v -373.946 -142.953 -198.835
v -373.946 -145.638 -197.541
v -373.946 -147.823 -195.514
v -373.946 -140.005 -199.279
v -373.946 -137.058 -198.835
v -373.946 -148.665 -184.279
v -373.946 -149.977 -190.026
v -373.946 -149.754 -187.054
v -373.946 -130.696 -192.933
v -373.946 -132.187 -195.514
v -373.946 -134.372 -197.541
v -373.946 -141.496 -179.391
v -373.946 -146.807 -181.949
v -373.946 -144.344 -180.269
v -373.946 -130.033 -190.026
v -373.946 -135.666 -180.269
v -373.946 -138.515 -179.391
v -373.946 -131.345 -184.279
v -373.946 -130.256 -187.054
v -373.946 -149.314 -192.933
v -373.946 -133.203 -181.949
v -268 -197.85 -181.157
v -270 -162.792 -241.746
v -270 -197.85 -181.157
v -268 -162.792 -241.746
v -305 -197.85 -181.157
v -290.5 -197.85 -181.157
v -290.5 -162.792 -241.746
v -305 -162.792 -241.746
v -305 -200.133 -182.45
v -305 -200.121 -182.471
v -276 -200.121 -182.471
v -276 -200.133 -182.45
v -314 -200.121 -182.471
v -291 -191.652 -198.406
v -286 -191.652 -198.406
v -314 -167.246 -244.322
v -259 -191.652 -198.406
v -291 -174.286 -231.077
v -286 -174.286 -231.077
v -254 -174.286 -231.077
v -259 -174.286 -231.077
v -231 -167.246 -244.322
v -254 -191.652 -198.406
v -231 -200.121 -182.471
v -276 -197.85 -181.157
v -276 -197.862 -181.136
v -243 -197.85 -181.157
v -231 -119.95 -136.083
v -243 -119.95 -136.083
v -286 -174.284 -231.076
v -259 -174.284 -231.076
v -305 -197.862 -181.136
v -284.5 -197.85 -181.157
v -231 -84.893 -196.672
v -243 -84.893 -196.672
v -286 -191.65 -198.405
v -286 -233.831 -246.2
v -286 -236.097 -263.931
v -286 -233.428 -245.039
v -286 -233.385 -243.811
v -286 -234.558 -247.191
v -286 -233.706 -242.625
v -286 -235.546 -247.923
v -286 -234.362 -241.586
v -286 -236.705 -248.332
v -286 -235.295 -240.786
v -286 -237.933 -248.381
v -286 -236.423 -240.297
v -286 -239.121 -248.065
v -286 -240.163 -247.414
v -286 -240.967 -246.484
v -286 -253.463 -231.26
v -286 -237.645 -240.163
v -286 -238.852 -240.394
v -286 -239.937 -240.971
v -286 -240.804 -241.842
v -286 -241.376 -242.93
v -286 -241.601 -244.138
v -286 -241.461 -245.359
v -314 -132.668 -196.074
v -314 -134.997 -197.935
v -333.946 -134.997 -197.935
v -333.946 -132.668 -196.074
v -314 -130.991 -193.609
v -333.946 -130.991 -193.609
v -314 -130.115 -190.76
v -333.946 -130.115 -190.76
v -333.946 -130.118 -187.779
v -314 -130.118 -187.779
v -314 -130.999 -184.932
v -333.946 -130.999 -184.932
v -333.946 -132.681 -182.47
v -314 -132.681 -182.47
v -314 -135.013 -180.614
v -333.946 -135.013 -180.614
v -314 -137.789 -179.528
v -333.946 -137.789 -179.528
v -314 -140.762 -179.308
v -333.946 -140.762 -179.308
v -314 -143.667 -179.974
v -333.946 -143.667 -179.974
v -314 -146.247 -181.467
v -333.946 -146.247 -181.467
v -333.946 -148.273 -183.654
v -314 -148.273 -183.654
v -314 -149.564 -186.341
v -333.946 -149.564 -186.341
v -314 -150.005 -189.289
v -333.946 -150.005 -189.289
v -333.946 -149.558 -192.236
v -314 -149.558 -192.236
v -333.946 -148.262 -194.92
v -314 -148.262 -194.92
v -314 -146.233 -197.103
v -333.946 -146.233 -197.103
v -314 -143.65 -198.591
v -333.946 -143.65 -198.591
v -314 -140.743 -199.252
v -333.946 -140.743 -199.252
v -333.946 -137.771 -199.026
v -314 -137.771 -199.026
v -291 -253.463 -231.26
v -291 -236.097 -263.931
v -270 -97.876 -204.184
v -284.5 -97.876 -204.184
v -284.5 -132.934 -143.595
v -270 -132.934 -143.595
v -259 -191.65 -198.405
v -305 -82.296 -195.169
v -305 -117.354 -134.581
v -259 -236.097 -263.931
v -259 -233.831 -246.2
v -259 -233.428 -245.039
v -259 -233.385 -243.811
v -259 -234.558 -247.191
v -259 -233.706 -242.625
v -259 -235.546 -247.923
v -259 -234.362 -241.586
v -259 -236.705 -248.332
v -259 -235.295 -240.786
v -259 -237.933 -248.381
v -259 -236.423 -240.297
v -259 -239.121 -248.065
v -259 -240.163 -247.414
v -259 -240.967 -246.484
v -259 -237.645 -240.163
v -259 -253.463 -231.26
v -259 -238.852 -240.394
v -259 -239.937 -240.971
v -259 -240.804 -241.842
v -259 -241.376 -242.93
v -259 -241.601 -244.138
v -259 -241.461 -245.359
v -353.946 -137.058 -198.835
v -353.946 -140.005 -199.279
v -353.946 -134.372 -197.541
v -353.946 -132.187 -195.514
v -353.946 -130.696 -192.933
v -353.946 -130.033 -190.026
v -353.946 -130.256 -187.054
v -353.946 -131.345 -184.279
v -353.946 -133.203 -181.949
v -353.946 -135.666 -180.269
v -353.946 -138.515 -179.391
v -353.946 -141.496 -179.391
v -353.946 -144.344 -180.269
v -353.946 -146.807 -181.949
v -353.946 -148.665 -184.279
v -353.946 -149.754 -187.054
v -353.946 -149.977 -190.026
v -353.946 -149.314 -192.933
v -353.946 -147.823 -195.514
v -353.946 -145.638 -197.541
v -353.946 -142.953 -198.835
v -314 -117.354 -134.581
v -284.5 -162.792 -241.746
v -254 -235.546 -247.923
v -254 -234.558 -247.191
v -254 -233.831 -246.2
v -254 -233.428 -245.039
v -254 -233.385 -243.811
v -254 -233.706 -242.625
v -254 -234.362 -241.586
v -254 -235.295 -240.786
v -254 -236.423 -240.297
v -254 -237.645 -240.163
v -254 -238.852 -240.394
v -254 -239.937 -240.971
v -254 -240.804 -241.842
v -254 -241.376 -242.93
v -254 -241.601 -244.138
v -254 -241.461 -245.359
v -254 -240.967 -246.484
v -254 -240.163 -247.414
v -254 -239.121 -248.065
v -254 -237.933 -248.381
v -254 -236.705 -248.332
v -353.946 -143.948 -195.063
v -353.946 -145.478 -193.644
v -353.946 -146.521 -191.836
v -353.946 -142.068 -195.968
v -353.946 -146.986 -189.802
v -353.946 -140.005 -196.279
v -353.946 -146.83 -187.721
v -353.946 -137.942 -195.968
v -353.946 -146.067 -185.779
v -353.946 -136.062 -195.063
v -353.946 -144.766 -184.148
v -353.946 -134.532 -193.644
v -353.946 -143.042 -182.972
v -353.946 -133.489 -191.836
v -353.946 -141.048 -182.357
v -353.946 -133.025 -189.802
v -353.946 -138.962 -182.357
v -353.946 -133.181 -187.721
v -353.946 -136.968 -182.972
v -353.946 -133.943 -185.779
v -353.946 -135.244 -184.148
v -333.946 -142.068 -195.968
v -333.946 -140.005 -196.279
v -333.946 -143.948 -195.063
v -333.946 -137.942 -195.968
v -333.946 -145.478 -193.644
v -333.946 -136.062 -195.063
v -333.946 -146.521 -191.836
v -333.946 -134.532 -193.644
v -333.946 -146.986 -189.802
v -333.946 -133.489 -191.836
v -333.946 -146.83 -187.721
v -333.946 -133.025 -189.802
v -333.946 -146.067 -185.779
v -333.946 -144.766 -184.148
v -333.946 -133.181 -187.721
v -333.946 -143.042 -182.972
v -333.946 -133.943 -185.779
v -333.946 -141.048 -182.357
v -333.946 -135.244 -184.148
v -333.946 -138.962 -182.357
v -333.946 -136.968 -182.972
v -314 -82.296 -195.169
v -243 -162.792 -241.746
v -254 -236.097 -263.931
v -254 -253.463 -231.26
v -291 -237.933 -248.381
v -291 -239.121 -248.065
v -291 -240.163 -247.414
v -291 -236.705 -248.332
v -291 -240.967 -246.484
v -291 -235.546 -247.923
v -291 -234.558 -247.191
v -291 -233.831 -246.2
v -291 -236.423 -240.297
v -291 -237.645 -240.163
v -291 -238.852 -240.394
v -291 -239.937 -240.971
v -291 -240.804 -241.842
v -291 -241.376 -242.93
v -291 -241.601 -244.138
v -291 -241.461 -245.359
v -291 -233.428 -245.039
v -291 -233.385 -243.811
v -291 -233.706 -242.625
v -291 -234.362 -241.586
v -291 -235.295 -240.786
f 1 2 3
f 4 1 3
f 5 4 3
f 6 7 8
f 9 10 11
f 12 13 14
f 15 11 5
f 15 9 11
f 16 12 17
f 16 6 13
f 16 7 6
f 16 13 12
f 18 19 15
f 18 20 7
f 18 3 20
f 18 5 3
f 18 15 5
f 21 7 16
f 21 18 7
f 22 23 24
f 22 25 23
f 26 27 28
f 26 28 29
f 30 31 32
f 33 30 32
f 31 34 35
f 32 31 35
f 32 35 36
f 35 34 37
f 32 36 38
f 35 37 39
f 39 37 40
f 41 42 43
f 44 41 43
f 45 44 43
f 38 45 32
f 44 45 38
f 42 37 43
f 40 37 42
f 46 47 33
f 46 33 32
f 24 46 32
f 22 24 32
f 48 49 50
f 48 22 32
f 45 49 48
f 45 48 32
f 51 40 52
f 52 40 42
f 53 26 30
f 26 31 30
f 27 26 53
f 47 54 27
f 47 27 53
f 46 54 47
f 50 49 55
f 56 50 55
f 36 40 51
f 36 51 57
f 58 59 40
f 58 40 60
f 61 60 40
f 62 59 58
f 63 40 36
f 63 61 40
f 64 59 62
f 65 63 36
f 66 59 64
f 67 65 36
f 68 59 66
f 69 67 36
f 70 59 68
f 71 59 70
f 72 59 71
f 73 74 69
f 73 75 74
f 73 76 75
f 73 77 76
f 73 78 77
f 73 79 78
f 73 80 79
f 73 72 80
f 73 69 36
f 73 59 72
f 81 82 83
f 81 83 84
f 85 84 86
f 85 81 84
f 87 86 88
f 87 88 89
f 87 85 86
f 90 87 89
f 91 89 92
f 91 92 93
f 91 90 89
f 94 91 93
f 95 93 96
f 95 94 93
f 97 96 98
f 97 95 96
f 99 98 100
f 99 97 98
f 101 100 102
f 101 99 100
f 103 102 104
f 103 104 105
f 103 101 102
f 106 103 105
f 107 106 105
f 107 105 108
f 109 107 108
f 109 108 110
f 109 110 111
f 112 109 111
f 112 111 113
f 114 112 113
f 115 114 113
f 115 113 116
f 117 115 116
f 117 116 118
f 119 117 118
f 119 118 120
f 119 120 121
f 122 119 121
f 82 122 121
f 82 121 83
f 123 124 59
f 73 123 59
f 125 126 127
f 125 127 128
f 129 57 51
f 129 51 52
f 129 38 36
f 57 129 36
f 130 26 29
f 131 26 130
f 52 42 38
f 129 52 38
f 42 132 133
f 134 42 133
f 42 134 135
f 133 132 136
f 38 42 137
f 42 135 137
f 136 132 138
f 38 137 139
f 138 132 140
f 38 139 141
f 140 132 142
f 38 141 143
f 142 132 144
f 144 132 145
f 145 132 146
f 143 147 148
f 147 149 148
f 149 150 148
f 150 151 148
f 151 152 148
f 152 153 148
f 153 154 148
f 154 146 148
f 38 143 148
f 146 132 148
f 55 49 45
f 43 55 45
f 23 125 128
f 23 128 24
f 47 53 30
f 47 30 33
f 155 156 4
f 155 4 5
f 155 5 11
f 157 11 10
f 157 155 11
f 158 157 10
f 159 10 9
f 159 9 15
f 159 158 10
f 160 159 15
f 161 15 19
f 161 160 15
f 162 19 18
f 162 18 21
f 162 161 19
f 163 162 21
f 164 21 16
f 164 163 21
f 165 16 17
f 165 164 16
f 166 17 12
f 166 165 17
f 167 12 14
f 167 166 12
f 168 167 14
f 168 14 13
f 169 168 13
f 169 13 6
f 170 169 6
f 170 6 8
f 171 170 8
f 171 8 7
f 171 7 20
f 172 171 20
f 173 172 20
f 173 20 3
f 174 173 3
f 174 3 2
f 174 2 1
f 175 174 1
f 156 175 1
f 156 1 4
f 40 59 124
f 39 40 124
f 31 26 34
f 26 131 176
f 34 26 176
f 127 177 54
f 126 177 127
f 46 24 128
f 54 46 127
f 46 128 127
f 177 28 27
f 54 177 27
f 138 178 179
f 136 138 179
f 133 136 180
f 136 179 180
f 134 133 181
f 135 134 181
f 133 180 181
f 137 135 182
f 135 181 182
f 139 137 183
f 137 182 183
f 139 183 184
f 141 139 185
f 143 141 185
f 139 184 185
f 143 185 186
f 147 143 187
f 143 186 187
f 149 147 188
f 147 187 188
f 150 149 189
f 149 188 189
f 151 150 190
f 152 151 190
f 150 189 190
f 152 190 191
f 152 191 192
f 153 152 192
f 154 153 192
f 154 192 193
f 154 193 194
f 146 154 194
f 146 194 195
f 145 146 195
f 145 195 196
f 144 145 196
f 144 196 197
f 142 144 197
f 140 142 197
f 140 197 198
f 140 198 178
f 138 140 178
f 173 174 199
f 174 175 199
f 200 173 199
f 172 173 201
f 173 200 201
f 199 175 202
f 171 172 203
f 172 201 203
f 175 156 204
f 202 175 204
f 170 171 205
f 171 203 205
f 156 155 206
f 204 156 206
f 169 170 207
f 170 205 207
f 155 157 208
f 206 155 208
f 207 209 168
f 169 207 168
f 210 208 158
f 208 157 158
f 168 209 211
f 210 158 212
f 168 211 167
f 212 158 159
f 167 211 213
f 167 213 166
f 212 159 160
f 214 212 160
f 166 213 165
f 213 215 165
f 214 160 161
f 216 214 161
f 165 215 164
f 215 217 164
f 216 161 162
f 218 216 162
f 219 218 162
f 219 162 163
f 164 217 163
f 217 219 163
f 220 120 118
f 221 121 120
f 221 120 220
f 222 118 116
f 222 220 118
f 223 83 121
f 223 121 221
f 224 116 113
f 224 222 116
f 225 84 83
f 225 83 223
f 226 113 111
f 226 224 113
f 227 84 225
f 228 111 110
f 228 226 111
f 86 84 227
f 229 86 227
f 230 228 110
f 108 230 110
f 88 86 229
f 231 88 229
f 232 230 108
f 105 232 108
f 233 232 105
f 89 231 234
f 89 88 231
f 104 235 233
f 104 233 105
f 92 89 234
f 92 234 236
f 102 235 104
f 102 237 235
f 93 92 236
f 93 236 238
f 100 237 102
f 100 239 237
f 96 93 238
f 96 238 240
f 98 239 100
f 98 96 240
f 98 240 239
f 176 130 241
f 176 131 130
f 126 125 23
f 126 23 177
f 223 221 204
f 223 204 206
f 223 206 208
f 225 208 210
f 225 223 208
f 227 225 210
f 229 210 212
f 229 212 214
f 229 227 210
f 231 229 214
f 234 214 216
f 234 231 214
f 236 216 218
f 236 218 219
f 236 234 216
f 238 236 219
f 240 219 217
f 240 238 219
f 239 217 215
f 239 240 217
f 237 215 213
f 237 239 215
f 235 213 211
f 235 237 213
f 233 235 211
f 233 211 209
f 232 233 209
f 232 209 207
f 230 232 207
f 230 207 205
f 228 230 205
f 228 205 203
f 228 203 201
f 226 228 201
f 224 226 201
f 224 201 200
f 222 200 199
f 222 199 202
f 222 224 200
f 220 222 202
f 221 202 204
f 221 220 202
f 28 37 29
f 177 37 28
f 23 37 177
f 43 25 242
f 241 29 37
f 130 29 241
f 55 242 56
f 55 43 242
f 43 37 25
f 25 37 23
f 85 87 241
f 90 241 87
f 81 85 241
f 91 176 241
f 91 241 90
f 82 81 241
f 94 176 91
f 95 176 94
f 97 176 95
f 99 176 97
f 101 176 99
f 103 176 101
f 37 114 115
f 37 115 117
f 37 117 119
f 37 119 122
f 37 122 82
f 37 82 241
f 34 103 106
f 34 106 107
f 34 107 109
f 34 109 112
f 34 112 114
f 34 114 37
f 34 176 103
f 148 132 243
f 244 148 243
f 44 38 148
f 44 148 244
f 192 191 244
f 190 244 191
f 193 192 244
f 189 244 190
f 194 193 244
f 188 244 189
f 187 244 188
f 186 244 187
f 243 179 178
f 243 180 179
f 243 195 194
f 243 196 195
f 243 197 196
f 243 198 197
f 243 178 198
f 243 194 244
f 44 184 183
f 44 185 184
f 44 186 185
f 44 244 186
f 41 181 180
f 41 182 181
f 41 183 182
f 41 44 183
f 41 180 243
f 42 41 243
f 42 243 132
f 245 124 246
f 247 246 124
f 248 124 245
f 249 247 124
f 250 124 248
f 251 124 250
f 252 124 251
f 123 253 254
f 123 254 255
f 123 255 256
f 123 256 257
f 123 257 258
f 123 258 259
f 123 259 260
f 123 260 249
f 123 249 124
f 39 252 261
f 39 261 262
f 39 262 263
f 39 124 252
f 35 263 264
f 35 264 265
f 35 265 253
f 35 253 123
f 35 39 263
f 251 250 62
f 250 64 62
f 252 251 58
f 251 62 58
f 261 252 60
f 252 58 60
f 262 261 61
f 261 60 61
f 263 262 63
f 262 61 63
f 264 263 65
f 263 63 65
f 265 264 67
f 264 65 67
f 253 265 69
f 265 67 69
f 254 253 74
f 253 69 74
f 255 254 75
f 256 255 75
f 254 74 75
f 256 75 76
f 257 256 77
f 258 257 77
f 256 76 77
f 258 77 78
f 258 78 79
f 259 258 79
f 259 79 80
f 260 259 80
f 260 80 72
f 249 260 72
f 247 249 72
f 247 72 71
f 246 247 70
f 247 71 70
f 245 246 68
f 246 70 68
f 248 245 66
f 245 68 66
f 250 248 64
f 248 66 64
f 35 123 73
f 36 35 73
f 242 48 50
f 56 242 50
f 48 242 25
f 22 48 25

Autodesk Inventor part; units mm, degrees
sketch "Sketch1" plane through (0, 0, 0) normal (1, 0, 0) x (0, 1, 0)
  line L0 (15, -38) -> (-51, -38)
  line L1 (-51, -38) -> (-51, -56)
  line L2 (-51, -56) -> (15, -56)
  line L3 (15, -38) -> (15, -56)
  arc A0 (29.5, -43.2058) -> (20.5, -58.7942) centre (25, -51) ccw
  arc A1 (33.0623, -37.0358) -> (16.9377, -64.9642) centre (25, -51) ccw
  line L4 (29.5, -43.2058) -> (39.0263, -48.7058)
  line L5 (20.5, -58.7942) -> (30.0263, -64.2942)
  line L6 (16.9377, -64.9642) -> (26.464, -70.4642)
  line L7 (33.0623, -37.0358) -> (42.5885, -42.5358)
  line L8 (42.5885, -42.5358) -> (39.0263, -48.7058)
  line L9 (30.0263, -64.2942) -> (26.464, -70.4642)
  line L10 (-51, -38) -> (-79, -38)
  line L11 (-79, -38) -> (-79, -56)
  line L12 (-51, -56) -> (-79, -56)
  dimension "d1" = 18
extrude "Extrusion1" add sketch "Sketch1" along normal blind 10 contours L3 A1 L2 L1 L0 | A1 L7 L8 L4 A0 L5 L9 L6 L2 L3 | L3 L2 A1
thicken "Thicken1" operation add thickness 5 both sides no extend neighbours yes toward (0, 0.8660254, -0.5) faces at (3.3333, 28.8389, -66.3509)
thicken "Thicken2" operation add thickness 5 both sides no extend neighbours yes toward (0, 0.8660254, -0.5) faces at (3.3333, 41.4011, -44.5924)
thicken "Thicken3" operation add thickness 200 both sides no extend neighbours yes toward (0, -1, 0) faces at (3.3333, -51, -44)
thicken "Thicken4" operation add thickness 30 both sides no extend neighbours yes toward (-1, 0, 0) faces at (0, -75.4432, -44)
sketch "Sketch2" plane through (10, 0, 0) normal (1, 0, 0) x (0, 0, -1)
  arc A0 (37.0358, 33.0623) -> (38.3509, 15) centre (51, 25) ccw projected
  line L0 (56, 10) -> (38.3509, 15)
  line L1 (38.3509, 15) -> (23, -17)
  line L2 (23, -17) -> (9, -332)
  line L3 (9, -332) -> (100, -328)
  line L4 (100, -328) -> (71, -47)
  line L5 (71, -47) -> (56, 10)
  point P0 (0, 0)
extrude "Extrusion2" cut sketch "Sketch2" against normal blind 100
sketch "Sketch3" plane through (10, 0, 0) normal (1, 0, 0) x (0, 0, -1)
  line L0 (56, 10) -> (152, -151)
  line L1 (152, -151) -> (131, -151)
  line L2 (38.3509, 15) -> (56, 10) projected
  line L3 (131, -151) -> (38.3509, 15)
  point P0 (0, 0)
extrude "Extrusion3" add sketch "Sketch3" against normal blind 40
thicken "Thicken5" operation add thickness 100 both sides no extend neighbours yes toward (0, -1, 0) faces at (-3.3333, -151, -145)
sketch "Sketch4" plane through (10, 0, 0) normal (1, 0, 0) x (0, 0, -1)
  line L0 (29, -65) -> (197, -65)
  line L1 (197, -65) -> (243, -262)
  line L2 (243, -262) -> (173, -278.3452)
  line L3 (173, -278.3452) -> (29, -65)
  point P0 (0, 0)
extrude "Extrusion4" cut sketch "Sketch4" against normal blind 40
thicken "Thicken6" operation add thickness 40 both sides no extend neighbours yes toward (1, 0, 0) faces at (10, 14.7562, -38.117)
thicken "Thicken7" operation add thickness 5 both sides no extend neighbours yes toward (0, -0.5, -0.8660254) faces at (-16.6667, 26.1753, -70.2976) (-3.3333, 10.1872, -57.3703) (-3.3333, -15.1835, -71.0162)
ref_plane "Work Plane1" through (10, -65, -83.0011) normal (1, 0, 0) x (0, 0, -1)
sketch "Sketch6" plane through (10, -65, -83.0011) normal (1, 0, 0) x (0, 0, -1)
  line L0 (23.5408, 0) -> (0, 0) projected
  line L1 (23.5408, 0) -> (65, -73)
  line L2 (65, -73) -> (86.5815, -111)
  line L3 (0, 0) -> (-44.6502, 80) projected
  line L4 (0, 0) -> (59, -111)
  line L5 (59, -111) -> (86.5815, -111)
  point P0 (-83.0011, 65)
extrude "Extrusion6" add sketch "Sketch6" along normal mid plane 40
thicken "Thicken8" operation add thickness 100 both sides no extend neighbours yes toward (0, -1, 0) faces at (3.3333, -176, -151.1949)
thicken "Thicken9" operation add thickness 20 both sides no extend neighbours yes toward (0, 0.8660254, -0.5) faces at (-16.6667, 45.7312, -47.0924)
thicken "Thicken10" operation add thickness 20 both sides no extend neighbours yes toward (0, 0.8660254, -0.5) faces at (-3.3333, 32.3357, -70.2943)
sketch "Sketch7" plane through (30, -65, -83.0011) normal (1, 0, 0) x (0, 0, -1)
  line L0 (112.1532, -211) -> (143.3749, -211) projected
  line L1 (23.5408, 0) -> (143.3749, -211) projected
  line L2 (143.3749, -211) -> (130, -187.4499)
  line L3 (130, -187.4499) -> (99.6355, -187.4499)
  line L4 (0, 0) -> (112.1532, -211) projected
  line L5 (112.1532, -211) -> (99.6355, -187.4499)
  point P0 (-83.0011, 65)
extrude "Extrusion7" add sketch "Sketch7" against normal blind 400
thicken "Thicken12" operation add thickness 65 both sides no extend neighbours yes toward (1, 0, 0) faces at (-370, -268.15, -211.5104)
sketch "Sketch8" plane through (-305, -276, -226.376) normal (-1, 0, 0) x (0, 0, 1)
  line L0 (43.7393, 23.5501) -> (13.3749, 23.5501) projected
  line L1 (43.7393, 23.5501) -> (20.991, 36.7127)
  line L2 (13.3749, 23.5501) -> (43.7393, 23.5501) projected
  line L3 (20.991, 36.7127) -> (13.3749, 23.5501)
  point P0 (226.376, 276)
extrude "Extrusion8" add sketch "Sketch8" against normal blind 300
sketch "Sketch9" plane through (-305, -239.2873, -205.385) normal (0, 0.8655505, 0.5008216) x (1, 0, 0)
  line L0 (0, -0.2177) -> (0, -27.2417) projected
  line L1 (0, -0.2177) -> (0, -27.2417)
  line L2 (0, -27.2417) -> (29, -27.2417)
  line L3 (0, -27.2417) -> (335, -27.2417) projected
  line L4 (0, -0.2177) -> (29, -0.2177)
  line L5 (0, -0.2177) -> (335, -0.2177) projected
  line L6 (29, -27.2417) -> (29, -0.2177)
  point P0 (305, -57.9308)
extrude "Extrusion9" add sketch "Sketch9" along normal blind 70
thicken "Thicken13" operation add thickness 15 both sides no extend neighbours yes toward (0, -0.8655505, -0.5008216) faces at (-295.3333, -187.8307, -154.5452)
thicken "Thicken14" operation add thickness 7 both sides no extend neighbours yes toward (0, -0.8655505, -0.5008216) faces at (-295.3333, -200.8139, -162.0576)
sketch "Sketch10" plane through (-276, -239.3964, -205.1965) normal (0, 0.5008216, -0.8655505) x (-1, 0, 0)
  line L0 (0, 48) -> (29, 48) projected
  line L1 (0, 48) -> (-35, 48)
  line L2 (-35, 48) -> (-35, 81)
  line L3 (-35, 81) -> (-35, 106)
  line L4 (29, 48) -> (29, 121)
  line L5 (-35, 106) -> (-35, 138)
  line L6 (-35, 138) -> (-45, 138)
  line L7 (-45, 138) -> (-45, 41)
  line L8 (-45, 41) -> (29, 41)
  line L9 (29, 0) -> (29, 48) projected
  line L10 (29, 41) -> (29, 48)
  line L11 (29, 48) -> (29, 41)
  line L12 (29, 121) -> (29, 141)
  line L13 (29, 141) -> (38, 141)
  line L14 (38, 141) -> (38, 41)
  line L15 (38, 41) -> (29, 41)
  line L16 (29, 81) -> (0, 81)
  line L17 (0, 81) -> (0, 48)
  point P0 (-276, 309.9765)
  dimension "d49" = 35
extrude "Extrusion10" add sketch "Sketch10" along normal blind 70 contours L0 L9 L8 L7 L6 L5 L3 L2 L1 | L4 L12 L13 L14 L15 L9
sketch "Sketch12" plane through (-276, -204.3389, -265.785) normal (0, 0.5008216, -0.8655505) x (-1, 0, 0)
  line L0 (29, 48) -> (0, 48) projected
  line L1 (14.5, 48) -> (14.5, 123)
  line L2 (14.5, 123) -> (-8, 123)
  line L3 (-8, 123) -> (-8, 48)
  line L4 (-8, 48) -> (14.5, 48)
  point P0 (-276, 309.9765)
extrude "Extrusion11" add sketch "Sketch12" against normal blind 70
thicken "Thicken15" operation add thickness 2 both sides no extend neighbours yes toward (-1, 0, 0) faces at (-268, -142.8866, -176.3122)
thicken "Thicken16" operation add thickness 2 both sides no extend neighbours yes toward (1, 0, 0) faces at (-290.5, -142.8866, -176.3122)
thicken "Thicken17" operation add thickness 4 both sides no extend neighbours yes toward (1, 0, 0) faces at (-288.5, -142.8866, -176.3122)
thicken "Thicken18" operation add thickness 2 both sides no extend neighbours yes toward (-1, 0, 0) faces at (-241, -160.1976, -186.3286)
ref_plane "Work Plane2" through (-137.5, -65, -83.0011) normal (1, 0, 0) x (0, 0, -1)
sketch "Sketch13" plane through (-137.5, -65, -83.0011) normal (1, 0, 0) x (0, 0, -1)
  line L0 (143.3749, -211) -> (112.1532, -211) projected
  line L1 (130, -187.4499) -> (143.3749, -211) projected
  line L2 (143.3749, -211) -> (14, -211)
  line L3 (14, -211) -> (14, -187.4499)
  line L4 (14, -187.4499) -> (130, -187.4499)
  point P0 (-83.0011, 65)
extrude "Extrusion12" add sketch "Sketch13" along normal mid plane 30
thicken "Thicken19" operation add thickness 150 both sides no extend neighbours yes toward (0, 0, 1) faces at (-142.5, -260.3, -97.0011)
thicken "Thicken20" operation add thickness 20 both sides no extend neighbours yes toward (0, 0, -1) faces at (-142.5, -260.3, 52.9989)
sketch "Sketch14" plane through (-152.5, -276, 32.9989) normal (0, 0, 1) x (1, 0, 0)
  line L0 (30, 23.5501) -> (30, 0) projected
  line L1 (0, 23.5501) -> (30, 23.5501) projected
  line L2 (0, 0) -> (30, 0) projected
  line L3 (0, 0) -> (0, 23.5501) projected
  circle A0 centre (15, 11.775) radius 8
  point P0 (152.5, 276)
extrude "Extrusion13" add sketch "Sketch14" along normal blind 70 contours A0
thicken "Thicken21" operation add thickness 30 both sides no extend neighbours yes toward (0, 0, -1) faces at (-134.9108, -264.8631, 102.9989)
sketch "Sketch15" plane through (-122.5, -65, -83.0011) normal (1, 0, 0) x (0, 0, -1)
  arc A0 (-202, -264) -> (-180, -132) centre (-216.7127, -193.7146) ccw
  arc A1 (-204.0725, -254.0995) -> (-185.1714, -140.6932) centre (-216.7127, -193.7146) ccw
  arc A2 (-200.0254, -273.433) -> (-175.0728, -123.7173) centre (-216.7127, -193.7146) ccw
  line L0 (-175.0728, -123.7173) -> (-185.1714, -140.6932)
  line L1 (-204.0725, -254.0995) -> (-200.0254, -273.433)
  point P0 (-83.0011, 65)
extrude "Extrusion14" add sketch "Sketch15" against normal blind 30
sketch "Sketch16" plane through (-122.5, -65, -83.0011) normal (1, 0, 0) x (0, 0, -1)
  point P0 (-83.0011, 65)
ref_plane "Work Plane3" through (-137.5, -65, -83.0011) normal (1, 0, 0) x (0, 0, -1)
sketch "Sketch17" plane through (-137.5, -65, -83.0011) normal (1, 0, 0) x (0, 0, -1)
  arc A0 (-204.0725, -254.0995) -> (-185.1714, -140.6932) centre (-216.7127, -193.7146) ccw projected
  arc A1 (-200.5833, -270.7677) -> (-176.465, -126.0576) centre (-216.7127, -193.7146) ccw
  line L0 (-176.465, -126.0576) -> (-223, -140.6932)
  line L1 (-223, -140.6932) -> (-219, -249)
  line L2 (-219, -249) -> (-200.5833, -270.7677)
  point P0 (-83.0011, 65)
extrude "Extrusion15" cut sketch "Sketch17" against normal blind 14
sketch "Sketch18" plane through (-122.5, -65, -83.0011) normal (1, 0, 0) x (0, 0, -1)
  point P0 (-83.0011, 65)
ref_plane "Work Plane4" through (-124.5, -65, -83.0011) normal (1, 0, 0) x (0, 0, -1)
sketch "Sketch19" plane through (-124.5, -65, -83.0011) normal (1, 0, 0) x (0, 0, -1)
  arc A0 (-200.0254, -273.433) -> (-175.0728, -123.7173) centre (-216.7127, -193.7146) ccw projected
  arc A1 (-200.6398, -270.4982) -> (-176.6058, -126.2942) centre (-216.7127, -193.7146) ccw
  line L0 (-176.6058, -126.2942) -> (-213.3412, -154.8678)
  line L1 (-213.3412, -154.8678) -> (-216.7127, -283)
  line L2 (-216.7127, -283) -> (-200.6398, -270.4982)
  point P0 (-83.0011, 65)
extrude "Extrusion16" cut sketch "Sketch19" against normal blind 14
thicken "Thicken22" operation add thickness 150 both sides no extend neighbours yes toward (1, 0, 0) faces at (-122.5, -268.15, -114.9306)
thicken "Thicken23" operation add thickness 150 both sides no extend neighbours yes toward (1, 0, 0) faces at (-152.5, -268.15, -114.9306)
thicken "Thicken24" operation add thickness 150 both sides no extend neighbours yes toward (1, 0, 0) faces at (-122.5, -266.9722, 59.5019)
thicken "Thicken25" operation add thickness 150 both sides no extend neighbours yes toward (1, 0, 0) faces at (-152.5, -266.9722, 59.5019)
sketch "Sketch20" plane through (-137.5, -264.225, 32.9989) normal (0, 0, -1) x (-1, 0, 0)
  circle A0 centre (0, 0) radius 10.0499
  point P0 (-137.5, 264.225)
extrude "Extrusion17" cut sketch "Sketch20" against normal blind 40
sketch "Sketch21" plane through (27.5, -276, 32.9989) normal (0, 0, 1) x (1, 0, 0)
  circle A0 centre (-13, 11) radius 8.9443
  point P0 (-27.5, 276)
extrude "Extrusion18" add sketch "Sketch21" along normal blind 40
thicken "Thicken26" operation add thickness 3 both sides no extend neighbours yes toward (0, -0.5353442, -0.844634) faces at (17.5, -302.3163, 64.9194) (7.5, -200.0346, 98.8042) (7.5, -331.9885, 118.3734) (17.5, -291.7419, 81.603)
thicken "Thicken27" operation add thickness 3 both sides no extend neighbours yes toward (-1, 0, 0) faces at (-2.5, -241.3228, 60.0882)
sketch "Sketch23" plane through (30, -65, -83.0011) normal (1, 0, 0) x (0, 0, -1)
  line L0 (143.3749, -211) -> (23.5408, 0) projected
  line L1 (112.1532, -211) -> (143.3749, -211) projected
  line L2 (0, 0) -> (112.1532, -211) projected
  line L3 (112.1532, -211) -> (227, -459)
  line L4 (227, -459) -> (284.2225, -459)
  line L5 (284.2225, -459) -> (143.3749, -211)
  point P0 (-83.0011, 65)
extrude "Extrusion19" add sketch "Sketch23" against normal blind 50
sketch "Sketch24" plane through (30.5, -258.7146, 133.7116) normal (1, 0, 0) x (0, -0.164399, -0.9863939)
  point P0 (89.3599, 277.1765)
ref_plane "Work Plane5" through (28.5, -258.7146, 133.7116) normal (1, 0, 0) x (0, -0.164399, -0.9863939)
sketch "Sketch25" plane through (28.5, -258.7146, 133.7116) normal (1, 0, 0) x (0, -0.164399, -0.9863939)
  arc A0 (29.5658, -75.8904) -> (29.5658, 75.8904) centre (0, 0) ccw projected
  arc A1 (28.9727, -74.3679) -> (28.9727, 74.3679) centre (0, 0) ccw
  line L0 (28.9727, 74.3679) -> (10, 52)
  line L1 (10, 52) -> (7, -23)
  line L2 (7, -23) -> (7, -70)
  line L3 (7, -70) -> (28.9727, -74.3679)
  point P0 (89.3599, 277.1765)
extrude "Extrusion20" cut sketch "Sketch25" against normal blind 31
sketch "Sketch26" plane through (-10, -65, -83.0011) normal (0, -0.4693491, 0.8830127) x (1, 0, 0)
  line L0 (-323, -166) -> (-187, -166)
  line L1 (-221, -167.8541) -> (-304, -167.8541) projected
  line L2 (-187, -166) -> (-176, 142)
  line L3 (-176, 142) -> (163, 177)
  line L4 (163, 177) -> (104, -166)
  line L5 (104, -166) -> (180, -544)
  line L6 (180, -544) -> (-44, -703)
  line L7 (-44, -703) -> (-203.3393, -623.5)
  line L8 (-203.3393, -623.5) -> (-196.1783, -422.9935)
  line L9 (-196.1783, -422.9935) -> (-455, -378.4732)
  line L10 (-455, -378.4732) -> (-323, -166)
  point P0 (10, 96.3523)
extrude "Extrusion21" cut sketch "Sketch26" along normal mid plane 1000
sketch "Sketch27" plane through (-305, -211.3842, -157.7664) normal (0, 0.8655505, 0.5008216) x (1, 0, 0)
  line L0 (0, 27) -> (45, 27)
  line L1 (45, 27) -> (45, -17)
  line L2 (45, -17) -> (8, -14)
  line L3 (8, -14) -> (-11, 2)
  line L4 (-11, 2) -> (0, 27)
  point P0 (305, -30.6891)
extrude "Extrusion22" cut sketch "Sketch27" against normal blind 10
sketch "Sketch28" plane through (-314, -167.2455, -244.3222) normal (0, -0.8830127, -0.4693491) x (1, 0, 0)
  line L0 (83, 0) -> (0, 0) projected
  line L1 (83, 70.0454) -> (83, 0) projected
  line L2 (0, 0) -> (0, 70.0454) projected
  point P0 (314, 137.2431)
sketch "Sketch29" plane through (-314, -167.2455, -244.3222) normal (0, -0.8830127, -0.4693491) x (1, 0, 0)
  line L0 (60, 15) -> (23, 15)
  line L1 (23, 15) -> (23, 52)
  line L2 (23, 52) -> (60, 52)
  line L3 (60, 52) -> (60, 15)
  point P0 (314, 137.2431)
extrude "Extrusion23" add sketch "Sketch29" along normal blind 70
sketch "Sketch30" plane through (-314, -229.0564, -277.1766) normal (0, -0.8830127, -0.4693491) x (1, 0, 0)
  line L0 (23, 15) -> (60, 15) projected
  line L1 (23, 15) -> (60, 15) projected
  line L2 (60, 15) -> (60, 52) projected
  line L3 (60, 52) -> (23, 52) projected
  line L4 (23, 52) -> (23, 15) projected
  line L5 (55, 15) -> (55, 52)
  line L6 (28, 15) -> (28, 52)
  point P0 (314, 137.2431)
extrude "Extrusion24" cut sketch "Sketch30" against normal blind 70 contours L6 L3 L5 L0
sketch "Sketch31" plane through (-254, -191.6516, -198.4055) normal (1, 0, 0) x (0, 0.4693491, -0.8830127)
  circle A0 centre (19, -62) radius 4.1231
  point P0 (-85.2431, 262.3523)
extrude "Extrusion25" cut sketch "Sketch31" against normal blind 70
sketch "Sketch32" plane through (-231, -119.9504, -136.0831) normal (1, 0, 0) x (0, 0.5008216, -0.8655505)
  circle A0 centre (36, -44) radius 10
  point P0 (-57.7131, 171.9765)
extrude "Extrusion26" add sketch "Sketch32" along normal blind 20
sketch "Sketch33" plane through (-211, -140.0051, -189.2791) normal (1, 0, 0) x (0, 0, -1)
  circle A0 centre (0, 0) radius 10 projected
  circle A1 centre (0, 0) radius 7
  point P0 (-189.2791, 140.0051)
extrude "Extrusion27" add sketch "Sketch33" along normal blind 20 contours A1
sketch "Sketch34" plane through (-191, -140.0051, -189.2791) normal (1, 0, 0) x (0, 0, -1)
  circle A0 centre (0, 0) radius 7 projected
  circle A1 centre (0, 0) radius 10
  point P0 (-189.2791, 140.0051)
extrude "Extrusion28" add sketch "Sketch34" along normal blind 20 contours A0 | A1
ref_plane "Work Plane6" through (-272.473, -82.2963, -195.1692) normal (-1, 0, 0) x (0, -0.5008216, 0.8655505)
mirror "Mirror1" about plane through (-272.473, -82.2963, -195.1692) normal (-1, 0, 0) of "Extrusion27", "Extrusion26", "Extrusion28"
sketch "Sketch35" plane through (-171, -140.0051, -189.2791) normal (1, 0, 0) x (0, 0, -1)
  circle A0 centre (0, 0) radius 18.2483
  point P0 (-189.2791, 140.0051)
extrude "Extrusion29" cut sketch "Sketch35" against normal blind 60
properties part number "grip"
